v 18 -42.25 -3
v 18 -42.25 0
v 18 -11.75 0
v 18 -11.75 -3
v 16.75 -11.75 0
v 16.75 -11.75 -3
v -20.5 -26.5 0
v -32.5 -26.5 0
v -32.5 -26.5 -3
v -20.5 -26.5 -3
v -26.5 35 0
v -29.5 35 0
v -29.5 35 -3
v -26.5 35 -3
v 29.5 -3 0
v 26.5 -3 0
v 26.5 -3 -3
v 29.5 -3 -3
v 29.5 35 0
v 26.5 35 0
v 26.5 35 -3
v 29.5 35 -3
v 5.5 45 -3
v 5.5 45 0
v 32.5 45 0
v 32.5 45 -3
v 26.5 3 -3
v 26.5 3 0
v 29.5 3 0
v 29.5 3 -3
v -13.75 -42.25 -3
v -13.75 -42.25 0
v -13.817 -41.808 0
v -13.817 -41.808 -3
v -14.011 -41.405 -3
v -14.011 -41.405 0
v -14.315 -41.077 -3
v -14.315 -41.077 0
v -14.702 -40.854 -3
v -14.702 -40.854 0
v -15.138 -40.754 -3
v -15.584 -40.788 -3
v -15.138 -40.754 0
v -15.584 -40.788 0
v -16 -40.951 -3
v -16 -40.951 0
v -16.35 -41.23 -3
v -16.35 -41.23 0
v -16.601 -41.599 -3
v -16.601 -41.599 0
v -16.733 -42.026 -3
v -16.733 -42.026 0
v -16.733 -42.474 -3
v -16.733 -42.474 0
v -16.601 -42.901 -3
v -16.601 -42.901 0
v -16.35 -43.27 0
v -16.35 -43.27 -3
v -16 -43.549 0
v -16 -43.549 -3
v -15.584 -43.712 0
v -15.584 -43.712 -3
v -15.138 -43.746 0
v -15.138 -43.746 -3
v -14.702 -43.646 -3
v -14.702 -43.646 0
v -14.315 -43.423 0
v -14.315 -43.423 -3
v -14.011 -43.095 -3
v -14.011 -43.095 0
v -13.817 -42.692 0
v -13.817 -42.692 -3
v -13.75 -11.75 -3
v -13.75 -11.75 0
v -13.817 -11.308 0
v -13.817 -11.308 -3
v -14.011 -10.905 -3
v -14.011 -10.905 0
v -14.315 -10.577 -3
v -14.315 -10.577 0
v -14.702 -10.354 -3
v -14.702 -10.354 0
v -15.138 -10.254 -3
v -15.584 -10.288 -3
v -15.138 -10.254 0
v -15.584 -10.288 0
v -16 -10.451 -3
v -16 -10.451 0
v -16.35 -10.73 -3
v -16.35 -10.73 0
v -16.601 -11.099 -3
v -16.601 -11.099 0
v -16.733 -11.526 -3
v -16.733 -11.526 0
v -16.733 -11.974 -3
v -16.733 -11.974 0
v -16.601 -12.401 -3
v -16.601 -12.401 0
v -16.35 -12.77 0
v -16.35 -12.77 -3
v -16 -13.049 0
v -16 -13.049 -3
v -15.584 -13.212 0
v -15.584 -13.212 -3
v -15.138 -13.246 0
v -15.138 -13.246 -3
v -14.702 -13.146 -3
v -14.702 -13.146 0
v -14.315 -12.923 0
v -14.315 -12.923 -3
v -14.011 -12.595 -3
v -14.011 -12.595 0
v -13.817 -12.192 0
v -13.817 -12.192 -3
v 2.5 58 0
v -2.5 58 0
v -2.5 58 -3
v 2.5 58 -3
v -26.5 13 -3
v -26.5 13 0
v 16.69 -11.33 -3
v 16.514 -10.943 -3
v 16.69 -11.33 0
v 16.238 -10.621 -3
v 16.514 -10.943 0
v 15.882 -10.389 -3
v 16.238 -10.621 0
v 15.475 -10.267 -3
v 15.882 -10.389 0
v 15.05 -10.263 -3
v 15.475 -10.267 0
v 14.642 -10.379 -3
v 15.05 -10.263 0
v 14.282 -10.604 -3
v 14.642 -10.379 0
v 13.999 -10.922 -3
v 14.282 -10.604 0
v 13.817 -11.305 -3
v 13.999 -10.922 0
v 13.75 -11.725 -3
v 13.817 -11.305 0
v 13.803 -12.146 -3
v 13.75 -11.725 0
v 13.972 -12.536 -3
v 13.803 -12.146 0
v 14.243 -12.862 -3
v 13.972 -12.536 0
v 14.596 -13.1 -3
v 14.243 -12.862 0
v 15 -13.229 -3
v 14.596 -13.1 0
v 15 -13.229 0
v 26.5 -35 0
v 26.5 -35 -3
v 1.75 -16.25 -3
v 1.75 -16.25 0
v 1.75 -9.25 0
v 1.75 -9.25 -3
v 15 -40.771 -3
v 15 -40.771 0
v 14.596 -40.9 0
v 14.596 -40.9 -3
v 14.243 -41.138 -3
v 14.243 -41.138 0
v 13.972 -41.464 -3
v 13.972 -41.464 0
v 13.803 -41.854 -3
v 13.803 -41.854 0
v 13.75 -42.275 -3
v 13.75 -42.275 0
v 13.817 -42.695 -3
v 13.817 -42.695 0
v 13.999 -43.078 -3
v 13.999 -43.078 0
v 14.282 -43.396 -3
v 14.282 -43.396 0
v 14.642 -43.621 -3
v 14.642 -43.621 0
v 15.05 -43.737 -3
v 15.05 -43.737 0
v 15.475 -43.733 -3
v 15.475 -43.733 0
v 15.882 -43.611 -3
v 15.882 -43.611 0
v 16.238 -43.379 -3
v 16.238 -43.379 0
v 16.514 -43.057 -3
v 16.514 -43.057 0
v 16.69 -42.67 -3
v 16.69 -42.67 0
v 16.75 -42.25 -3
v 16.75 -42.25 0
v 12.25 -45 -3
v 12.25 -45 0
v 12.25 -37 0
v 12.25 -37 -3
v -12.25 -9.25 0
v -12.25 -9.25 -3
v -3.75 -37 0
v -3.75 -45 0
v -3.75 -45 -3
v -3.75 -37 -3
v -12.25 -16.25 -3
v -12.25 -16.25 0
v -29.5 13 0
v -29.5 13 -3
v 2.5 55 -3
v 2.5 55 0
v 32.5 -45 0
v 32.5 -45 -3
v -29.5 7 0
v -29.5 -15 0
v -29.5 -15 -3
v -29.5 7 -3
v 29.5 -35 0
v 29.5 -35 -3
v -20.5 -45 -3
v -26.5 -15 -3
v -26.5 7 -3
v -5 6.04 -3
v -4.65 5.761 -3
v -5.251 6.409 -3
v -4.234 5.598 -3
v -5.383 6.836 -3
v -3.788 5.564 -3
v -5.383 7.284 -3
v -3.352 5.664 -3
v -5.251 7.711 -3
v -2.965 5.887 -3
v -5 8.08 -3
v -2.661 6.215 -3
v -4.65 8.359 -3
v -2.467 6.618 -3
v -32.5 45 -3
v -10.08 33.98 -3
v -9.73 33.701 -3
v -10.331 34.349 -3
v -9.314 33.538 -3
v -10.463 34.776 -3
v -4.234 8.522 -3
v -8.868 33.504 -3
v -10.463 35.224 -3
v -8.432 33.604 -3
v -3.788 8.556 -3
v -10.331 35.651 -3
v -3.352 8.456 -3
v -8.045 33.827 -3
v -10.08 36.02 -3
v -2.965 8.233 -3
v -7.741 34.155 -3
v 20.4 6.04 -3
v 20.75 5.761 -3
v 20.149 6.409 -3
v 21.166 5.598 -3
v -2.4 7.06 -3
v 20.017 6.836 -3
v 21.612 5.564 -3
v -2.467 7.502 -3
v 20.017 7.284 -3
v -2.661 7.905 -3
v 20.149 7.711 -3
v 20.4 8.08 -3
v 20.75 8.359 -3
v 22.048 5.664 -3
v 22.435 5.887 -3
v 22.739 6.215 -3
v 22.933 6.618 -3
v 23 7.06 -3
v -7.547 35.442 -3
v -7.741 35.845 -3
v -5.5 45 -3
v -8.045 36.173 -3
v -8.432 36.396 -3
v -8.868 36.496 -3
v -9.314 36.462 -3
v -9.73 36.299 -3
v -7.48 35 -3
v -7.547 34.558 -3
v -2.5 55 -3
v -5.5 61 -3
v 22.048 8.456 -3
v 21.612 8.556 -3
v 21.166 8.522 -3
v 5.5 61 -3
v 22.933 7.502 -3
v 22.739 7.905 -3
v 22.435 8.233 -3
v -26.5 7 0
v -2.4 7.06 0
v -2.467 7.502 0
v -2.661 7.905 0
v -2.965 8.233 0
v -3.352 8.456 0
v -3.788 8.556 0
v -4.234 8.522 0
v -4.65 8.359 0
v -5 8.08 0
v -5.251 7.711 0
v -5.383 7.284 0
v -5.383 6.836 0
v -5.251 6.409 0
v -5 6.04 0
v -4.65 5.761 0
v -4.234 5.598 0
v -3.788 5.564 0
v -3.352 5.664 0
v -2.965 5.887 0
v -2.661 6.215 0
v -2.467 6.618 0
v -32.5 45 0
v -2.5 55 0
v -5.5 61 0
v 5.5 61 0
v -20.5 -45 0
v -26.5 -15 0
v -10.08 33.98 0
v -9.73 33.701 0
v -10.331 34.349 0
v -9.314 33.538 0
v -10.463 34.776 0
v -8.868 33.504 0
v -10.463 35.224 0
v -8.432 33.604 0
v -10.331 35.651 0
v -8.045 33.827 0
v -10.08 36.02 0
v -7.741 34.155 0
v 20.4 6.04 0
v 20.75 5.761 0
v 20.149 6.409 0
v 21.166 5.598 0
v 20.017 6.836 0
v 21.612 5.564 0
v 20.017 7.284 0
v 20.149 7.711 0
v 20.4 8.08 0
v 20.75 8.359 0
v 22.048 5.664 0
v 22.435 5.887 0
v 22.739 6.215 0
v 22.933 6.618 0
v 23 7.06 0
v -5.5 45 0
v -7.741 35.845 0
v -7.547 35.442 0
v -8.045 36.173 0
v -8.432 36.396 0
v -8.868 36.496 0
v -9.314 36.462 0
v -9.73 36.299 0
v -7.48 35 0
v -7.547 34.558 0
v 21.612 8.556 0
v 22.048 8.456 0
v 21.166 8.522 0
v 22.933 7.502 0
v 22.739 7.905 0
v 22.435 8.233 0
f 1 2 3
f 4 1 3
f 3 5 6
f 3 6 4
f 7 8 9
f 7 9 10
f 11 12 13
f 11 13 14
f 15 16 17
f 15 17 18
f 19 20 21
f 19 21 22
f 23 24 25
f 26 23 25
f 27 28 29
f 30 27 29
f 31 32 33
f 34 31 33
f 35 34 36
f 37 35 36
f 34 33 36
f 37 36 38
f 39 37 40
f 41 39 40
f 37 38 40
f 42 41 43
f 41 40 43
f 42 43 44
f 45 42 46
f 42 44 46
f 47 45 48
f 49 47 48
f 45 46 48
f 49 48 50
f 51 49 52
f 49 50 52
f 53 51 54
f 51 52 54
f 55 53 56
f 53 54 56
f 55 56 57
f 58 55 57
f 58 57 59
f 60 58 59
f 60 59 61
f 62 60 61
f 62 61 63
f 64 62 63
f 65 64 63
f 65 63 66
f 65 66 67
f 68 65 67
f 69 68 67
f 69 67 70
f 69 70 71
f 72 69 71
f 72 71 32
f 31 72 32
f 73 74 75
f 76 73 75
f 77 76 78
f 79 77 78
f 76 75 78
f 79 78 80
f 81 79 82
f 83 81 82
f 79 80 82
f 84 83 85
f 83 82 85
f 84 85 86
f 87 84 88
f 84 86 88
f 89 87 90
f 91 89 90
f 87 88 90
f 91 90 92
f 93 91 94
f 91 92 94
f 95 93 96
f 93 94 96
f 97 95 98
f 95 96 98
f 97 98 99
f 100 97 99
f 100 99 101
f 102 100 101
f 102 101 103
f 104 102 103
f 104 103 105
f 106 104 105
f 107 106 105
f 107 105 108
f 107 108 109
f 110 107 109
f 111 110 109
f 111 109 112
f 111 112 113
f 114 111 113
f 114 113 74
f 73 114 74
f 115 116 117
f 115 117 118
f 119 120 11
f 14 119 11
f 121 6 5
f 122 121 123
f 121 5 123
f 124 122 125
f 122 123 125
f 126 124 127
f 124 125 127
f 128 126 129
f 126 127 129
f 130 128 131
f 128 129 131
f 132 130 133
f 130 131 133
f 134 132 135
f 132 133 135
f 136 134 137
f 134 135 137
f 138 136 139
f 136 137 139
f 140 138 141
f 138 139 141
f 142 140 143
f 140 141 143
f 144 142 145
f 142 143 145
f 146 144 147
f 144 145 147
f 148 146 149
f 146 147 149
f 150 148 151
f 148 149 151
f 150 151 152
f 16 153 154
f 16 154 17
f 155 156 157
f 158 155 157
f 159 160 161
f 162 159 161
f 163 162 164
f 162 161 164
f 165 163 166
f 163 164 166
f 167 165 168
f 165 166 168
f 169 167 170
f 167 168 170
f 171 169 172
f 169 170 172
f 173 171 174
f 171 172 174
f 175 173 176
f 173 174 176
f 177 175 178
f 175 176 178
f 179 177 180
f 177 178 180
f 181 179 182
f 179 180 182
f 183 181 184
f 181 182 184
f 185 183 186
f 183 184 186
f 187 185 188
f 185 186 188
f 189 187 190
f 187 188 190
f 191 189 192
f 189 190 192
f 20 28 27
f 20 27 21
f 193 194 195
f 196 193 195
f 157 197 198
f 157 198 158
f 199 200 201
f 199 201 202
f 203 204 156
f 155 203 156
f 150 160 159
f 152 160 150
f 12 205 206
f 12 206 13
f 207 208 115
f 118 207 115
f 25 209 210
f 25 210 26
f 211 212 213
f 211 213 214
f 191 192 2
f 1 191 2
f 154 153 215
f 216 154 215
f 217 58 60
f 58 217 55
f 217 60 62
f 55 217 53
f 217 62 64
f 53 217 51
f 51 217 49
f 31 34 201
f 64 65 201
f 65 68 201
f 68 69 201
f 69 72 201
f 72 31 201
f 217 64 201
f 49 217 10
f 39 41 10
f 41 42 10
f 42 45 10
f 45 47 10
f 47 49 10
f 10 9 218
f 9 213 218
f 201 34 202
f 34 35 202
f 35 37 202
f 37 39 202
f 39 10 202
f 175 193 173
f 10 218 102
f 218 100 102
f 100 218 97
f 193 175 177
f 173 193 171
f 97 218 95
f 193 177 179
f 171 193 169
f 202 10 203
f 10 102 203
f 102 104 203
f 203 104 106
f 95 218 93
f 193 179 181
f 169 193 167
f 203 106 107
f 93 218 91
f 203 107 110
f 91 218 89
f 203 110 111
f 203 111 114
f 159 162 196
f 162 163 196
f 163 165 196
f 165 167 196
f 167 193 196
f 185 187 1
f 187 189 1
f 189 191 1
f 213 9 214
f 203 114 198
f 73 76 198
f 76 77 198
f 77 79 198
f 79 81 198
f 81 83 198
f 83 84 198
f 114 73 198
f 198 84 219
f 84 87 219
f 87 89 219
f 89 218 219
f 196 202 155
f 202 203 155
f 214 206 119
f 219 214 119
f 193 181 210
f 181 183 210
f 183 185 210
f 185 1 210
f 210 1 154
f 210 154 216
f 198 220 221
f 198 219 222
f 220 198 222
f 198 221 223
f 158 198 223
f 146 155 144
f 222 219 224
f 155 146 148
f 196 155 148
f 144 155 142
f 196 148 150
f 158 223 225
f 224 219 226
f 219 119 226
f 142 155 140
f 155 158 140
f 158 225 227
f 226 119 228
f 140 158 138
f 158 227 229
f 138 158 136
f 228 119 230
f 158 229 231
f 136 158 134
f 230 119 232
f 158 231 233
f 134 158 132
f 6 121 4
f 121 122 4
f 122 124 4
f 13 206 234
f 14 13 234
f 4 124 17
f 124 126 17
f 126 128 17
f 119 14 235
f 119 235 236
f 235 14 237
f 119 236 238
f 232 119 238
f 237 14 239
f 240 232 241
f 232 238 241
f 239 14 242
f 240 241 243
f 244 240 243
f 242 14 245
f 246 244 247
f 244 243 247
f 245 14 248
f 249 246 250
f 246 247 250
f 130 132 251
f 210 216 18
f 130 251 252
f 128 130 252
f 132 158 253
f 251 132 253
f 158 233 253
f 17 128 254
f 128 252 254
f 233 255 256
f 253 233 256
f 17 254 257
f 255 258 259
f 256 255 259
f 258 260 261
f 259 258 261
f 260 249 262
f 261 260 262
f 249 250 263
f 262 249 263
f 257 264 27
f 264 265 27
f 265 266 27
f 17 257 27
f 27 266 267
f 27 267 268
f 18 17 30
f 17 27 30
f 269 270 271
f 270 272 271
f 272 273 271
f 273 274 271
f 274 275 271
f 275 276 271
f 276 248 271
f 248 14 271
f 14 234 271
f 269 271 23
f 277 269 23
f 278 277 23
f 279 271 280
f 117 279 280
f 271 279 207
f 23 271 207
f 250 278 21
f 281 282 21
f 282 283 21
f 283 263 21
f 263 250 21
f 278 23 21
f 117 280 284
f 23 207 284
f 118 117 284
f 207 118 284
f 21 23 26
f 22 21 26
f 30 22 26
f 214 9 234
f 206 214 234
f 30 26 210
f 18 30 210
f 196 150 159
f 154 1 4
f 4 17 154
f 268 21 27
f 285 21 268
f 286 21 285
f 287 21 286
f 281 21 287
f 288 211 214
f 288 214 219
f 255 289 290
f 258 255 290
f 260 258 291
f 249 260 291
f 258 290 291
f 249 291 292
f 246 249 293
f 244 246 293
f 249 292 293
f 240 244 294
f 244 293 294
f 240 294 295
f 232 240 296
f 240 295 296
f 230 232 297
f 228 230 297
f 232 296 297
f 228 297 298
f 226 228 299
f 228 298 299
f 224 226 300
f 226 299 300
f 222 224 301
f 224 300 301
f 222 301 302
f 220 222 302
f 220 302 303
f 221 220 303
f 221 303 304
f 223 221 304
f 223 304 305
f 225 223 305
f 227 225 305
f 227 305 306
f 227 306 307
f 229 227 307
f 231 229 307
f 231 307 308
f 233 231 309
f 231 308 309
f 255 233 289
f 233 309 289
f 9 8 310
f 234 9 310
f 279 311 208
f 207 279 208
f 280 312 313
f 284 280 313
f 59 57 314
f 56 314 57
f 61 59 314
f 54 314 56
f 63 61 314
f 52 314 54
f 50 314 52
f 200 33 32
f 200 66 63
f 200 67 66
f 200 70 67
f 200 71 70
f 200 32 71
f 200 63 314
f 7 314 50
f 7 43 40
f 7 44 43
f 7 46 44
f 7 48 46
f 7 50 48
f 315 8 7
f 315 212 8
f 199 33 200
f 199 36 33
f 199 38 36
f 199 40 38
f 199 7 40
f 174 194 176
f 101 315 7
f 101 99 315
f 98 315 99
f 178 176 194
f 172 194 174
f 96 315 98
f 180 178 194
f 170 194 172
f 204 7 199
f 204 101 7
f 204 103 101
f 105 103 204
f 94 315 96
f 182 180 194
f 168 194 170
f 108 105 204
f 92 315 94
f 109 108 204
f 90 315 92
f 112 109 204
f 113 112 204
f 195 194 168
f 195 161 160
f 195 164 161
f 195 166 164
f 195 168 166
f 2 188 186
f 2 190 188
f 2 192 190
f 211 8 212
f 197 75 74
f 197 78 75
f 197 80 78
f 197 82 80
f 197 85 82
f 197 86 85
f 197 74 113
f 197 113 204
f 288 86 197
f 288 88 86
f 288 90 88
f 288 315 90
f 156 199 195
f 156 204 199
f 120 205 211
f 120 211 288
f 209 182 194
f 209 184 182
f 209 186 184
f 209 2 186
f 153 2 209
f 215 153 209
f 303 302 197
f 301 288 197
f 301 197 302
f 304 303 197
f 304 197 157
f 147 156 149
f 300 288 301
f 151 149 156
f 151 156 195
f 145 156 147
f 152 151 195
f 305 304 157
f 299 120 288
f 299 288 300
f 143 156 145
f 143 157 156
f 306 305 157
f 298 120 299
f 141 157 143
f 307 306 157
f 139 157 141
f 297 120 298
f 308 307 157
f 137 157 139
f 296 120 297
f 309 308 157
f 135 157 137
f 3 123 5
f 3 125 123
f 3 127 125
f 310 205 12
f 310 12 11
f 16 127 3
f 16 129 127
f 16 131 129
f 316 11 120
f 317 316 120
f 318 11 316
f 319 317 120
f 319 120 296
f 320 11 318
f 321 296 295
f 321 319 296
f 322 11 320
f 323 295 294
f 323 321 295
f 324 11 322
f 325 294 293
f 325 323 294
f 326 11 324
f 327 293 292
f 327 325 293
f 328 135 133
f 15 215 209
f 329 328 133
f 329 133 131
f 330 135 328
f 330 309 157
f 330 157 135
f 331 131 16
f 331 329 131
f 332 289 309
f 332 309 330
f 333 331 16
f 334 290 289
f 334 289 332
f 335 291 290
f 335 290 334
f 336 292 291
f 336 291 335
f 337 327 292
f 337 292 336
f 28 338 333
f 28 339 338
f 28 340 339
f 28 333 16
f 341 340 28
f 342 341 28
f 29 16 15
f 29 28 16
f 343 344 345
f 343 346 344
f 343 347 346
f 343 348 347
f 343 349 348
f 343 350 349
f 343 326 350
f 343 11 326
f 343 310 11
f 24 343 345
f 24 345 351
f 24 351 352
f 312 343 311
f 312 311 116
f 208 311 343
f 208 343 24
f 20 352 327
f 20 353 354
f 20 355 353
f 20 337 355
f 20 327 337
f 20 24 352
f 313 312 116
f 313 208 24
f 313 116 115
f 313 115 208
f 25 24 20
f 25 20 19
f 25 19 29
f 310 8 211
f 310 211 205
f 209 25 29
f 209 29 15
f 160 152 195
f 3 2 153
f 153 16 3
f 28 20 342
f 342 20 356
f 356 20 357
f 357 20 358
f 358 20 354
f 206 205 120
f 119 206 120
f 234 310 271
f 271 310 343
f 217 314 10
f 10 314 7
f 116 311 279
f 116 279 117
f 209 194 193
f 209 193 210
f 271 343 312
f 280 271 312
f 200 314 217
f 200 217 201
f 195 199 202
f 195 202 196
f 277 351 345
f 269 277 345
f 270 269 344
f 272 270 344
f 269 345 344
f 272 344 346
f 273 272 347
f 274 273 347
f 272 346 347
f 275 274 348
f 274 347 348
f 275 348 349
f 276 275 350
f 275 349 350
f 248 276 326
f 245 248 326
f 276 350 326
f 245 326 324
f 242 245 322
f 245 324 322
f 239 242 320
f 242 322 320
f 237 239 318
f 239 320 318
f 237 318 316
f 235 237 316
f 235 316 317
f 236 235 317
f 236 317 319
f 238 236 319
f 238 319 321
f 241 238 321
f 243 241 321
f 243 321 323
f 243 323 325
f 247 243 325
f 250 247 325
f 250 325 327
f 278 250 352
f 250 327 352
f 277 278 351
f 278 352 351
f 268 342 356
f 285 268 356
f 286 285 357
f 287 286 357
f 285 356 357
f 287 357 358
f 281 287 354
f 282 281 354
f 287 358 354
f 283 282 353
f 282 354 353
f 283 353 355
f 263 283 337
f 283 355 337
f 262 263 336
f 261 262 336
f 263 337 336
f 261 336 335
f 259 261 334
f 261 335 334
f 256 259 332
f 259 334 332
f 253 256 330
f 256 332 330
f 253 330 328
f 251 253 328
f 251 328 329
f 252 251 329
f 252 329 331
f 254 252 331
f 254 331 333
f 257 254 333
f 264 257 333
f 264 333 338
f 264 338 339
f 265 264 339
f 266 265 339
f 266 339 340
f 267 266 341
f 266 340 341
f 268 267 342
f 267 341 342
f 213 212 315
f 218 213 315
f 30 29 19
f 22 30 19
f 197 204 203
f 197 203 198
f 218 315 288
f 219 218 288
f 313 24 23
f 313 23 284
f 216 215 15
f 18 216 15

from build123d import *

# Parameters (mm, degrees)
SKETCH1_W           = 65
SKETCH1_H           = 90
BOSS_EXTRUDE1_DEPTH = 3
SKETCH3_R           = 1.5
CUT_EXTRUDE2_DEPTH  = 3
SKETCH4_R           = 1.5
CUT_EXTRUDE3_DEPTH  = 4
SKETCH5_W           = 3
SKETCH5_H           = 32
CUT_EXTRUDE4_DEPTH  = 4
SKETCH6_W           = 3
SKETCH6_H           = 22
CUT_EXTRUDE5_DEPTH  = 4
SKETCH7_W           = 3
SKETCH7_H           = 30.5
SKETCH7_W_2         = 14
SKETCH7_H_2         = 7
SKETCH7_W_3         = 16
SKETCH7_H_3         = 8
CUT_EXTRUDE6_DEPTH  = 4
SKETCH8_W           = 12
SKETCH8_H           = 18.5
CUT_EXTRUDE7_DEPTH  = 4
SKETCH10_W          = 11
SKETCH10_H          = 16
SKETCH10_W_2        = 5
SKETCH10_H_2        = 3
BOSS_EXTRUDE3_DEPTH = 3


with BuildPart() as part:
    # Sketch1 → Boss-Extrude1 (new body)
    with BuildSketch(Plane.XY):
        Rectangle(SKETCH1_W, SKETCH1_H)
    extrude(amount=-BOSS_EXTRUDE1_DEPTH)

    # Sketch3 → Cut-Extrude2 (cut)
    with BuildSketch(Plane.XY):
        with Locations((-8.98, 35)):
            Circle(SKETCH3_R)
        with Locations((-3.9, 7.06)):
            Circle(SKETCH3_R)
        with Locations((21.5, 7.06)):
            Circle(SKETCH3_R)
    extrude(amount=-CUT_EXTRUDE2_DEPTH, mode=Mode.SUBTRACT)

    # Sketch4 → Cut-Extrude3 (cut, through all)
    with BuildSketch(Plane.XY):
        with Locations((-15.25, -42.25)):
            Circle(SKETCH4_R)
        with Locations((-15.25, -11.75)):
            Circle(SKETCH4_R)
        with Locations((15.25, -42.25)):
            Circle(SKETCH4_R)
        with Locations((15.25, -11.75)):
            Circle(SKETCH4_R)
    extrude(amount=-CUT_EXTRUDE3_DEPTH, mode=Mode.SUBTRACT)

    # Sketch5 → Cut-Extrude4 (cut, through all)
    with BuildSketch(Plane.XY):
        with Locations((28, -19)):
            Rectangle(SKETCH5_W, SKETCH5_H)
        with Locations((28, 19)):
            Rectangle(SKETCH5_W, SKETCH5_H)
    extrude(amount=-CUT_EXTRUDE4_DEPTH, mode=Mode.SUBTRACT)

    # Sketch6 → Cut-Extrude5 (cut, through all)
    with BuildSketch(Plane.XY):
        with Locations((-28, -4)):
            Rectangle(SKETCH6_W, SKETCH6_H)
        with Locations((-28, 24)):
            Rectangle(SKETCH6_W, SKETCH6_H)
    extrude(amount=-CUT_EXTRUDE5_DEPTH, mode=Mode.SUBTRACT)

    # Sketch7 → Cut-Extrude6 (cut, through all)
    with BuildSketch(Plane.XY):
        with Locations((16.5, -27)):
            Rectangle(SKETCH7_W, SKETCH7_H)
        with Locations((-5.25, -12.75)):
            Rectangle(SKETCH7_W_2, SKETCH7_H_2)
        with Locations((4.25, -41)):
            Rectangle(SKETCH7_W_3, SKETCH7_H_3)
    extrude(amount=-CUT_EXTRUDE6_DEPTH, mode=Mode.SUBTRACT)

    # Sketch8 → Cut-Extrude7 (cut, through all)
    with BuildSketch(Plane.XY):
        with Locations((-26.5, -35.75)):
            Rectangle(SKETCH8_W, SKETCH8_H)
    extrude(amount=-CUT_EXTRUDE7_DEPTH, mode=Mode.SUBTRACT)

    # Sketch10 → Boss-Extrude3 (add)
    with BuildSketch(Plane.XY):
        with Locations((0, 53)):
            Rectangle(SKETCH10_W, SKETCH10_H)
        with Locations((0, 56.5)):
            Rectangle(SKETCH10_W_2, SKETCH10_H_2, mode=Mode.SUBTRACT)
    extrude(amount=-BOSS_EXTRUDE3_DEPTH)


solid = part.part
